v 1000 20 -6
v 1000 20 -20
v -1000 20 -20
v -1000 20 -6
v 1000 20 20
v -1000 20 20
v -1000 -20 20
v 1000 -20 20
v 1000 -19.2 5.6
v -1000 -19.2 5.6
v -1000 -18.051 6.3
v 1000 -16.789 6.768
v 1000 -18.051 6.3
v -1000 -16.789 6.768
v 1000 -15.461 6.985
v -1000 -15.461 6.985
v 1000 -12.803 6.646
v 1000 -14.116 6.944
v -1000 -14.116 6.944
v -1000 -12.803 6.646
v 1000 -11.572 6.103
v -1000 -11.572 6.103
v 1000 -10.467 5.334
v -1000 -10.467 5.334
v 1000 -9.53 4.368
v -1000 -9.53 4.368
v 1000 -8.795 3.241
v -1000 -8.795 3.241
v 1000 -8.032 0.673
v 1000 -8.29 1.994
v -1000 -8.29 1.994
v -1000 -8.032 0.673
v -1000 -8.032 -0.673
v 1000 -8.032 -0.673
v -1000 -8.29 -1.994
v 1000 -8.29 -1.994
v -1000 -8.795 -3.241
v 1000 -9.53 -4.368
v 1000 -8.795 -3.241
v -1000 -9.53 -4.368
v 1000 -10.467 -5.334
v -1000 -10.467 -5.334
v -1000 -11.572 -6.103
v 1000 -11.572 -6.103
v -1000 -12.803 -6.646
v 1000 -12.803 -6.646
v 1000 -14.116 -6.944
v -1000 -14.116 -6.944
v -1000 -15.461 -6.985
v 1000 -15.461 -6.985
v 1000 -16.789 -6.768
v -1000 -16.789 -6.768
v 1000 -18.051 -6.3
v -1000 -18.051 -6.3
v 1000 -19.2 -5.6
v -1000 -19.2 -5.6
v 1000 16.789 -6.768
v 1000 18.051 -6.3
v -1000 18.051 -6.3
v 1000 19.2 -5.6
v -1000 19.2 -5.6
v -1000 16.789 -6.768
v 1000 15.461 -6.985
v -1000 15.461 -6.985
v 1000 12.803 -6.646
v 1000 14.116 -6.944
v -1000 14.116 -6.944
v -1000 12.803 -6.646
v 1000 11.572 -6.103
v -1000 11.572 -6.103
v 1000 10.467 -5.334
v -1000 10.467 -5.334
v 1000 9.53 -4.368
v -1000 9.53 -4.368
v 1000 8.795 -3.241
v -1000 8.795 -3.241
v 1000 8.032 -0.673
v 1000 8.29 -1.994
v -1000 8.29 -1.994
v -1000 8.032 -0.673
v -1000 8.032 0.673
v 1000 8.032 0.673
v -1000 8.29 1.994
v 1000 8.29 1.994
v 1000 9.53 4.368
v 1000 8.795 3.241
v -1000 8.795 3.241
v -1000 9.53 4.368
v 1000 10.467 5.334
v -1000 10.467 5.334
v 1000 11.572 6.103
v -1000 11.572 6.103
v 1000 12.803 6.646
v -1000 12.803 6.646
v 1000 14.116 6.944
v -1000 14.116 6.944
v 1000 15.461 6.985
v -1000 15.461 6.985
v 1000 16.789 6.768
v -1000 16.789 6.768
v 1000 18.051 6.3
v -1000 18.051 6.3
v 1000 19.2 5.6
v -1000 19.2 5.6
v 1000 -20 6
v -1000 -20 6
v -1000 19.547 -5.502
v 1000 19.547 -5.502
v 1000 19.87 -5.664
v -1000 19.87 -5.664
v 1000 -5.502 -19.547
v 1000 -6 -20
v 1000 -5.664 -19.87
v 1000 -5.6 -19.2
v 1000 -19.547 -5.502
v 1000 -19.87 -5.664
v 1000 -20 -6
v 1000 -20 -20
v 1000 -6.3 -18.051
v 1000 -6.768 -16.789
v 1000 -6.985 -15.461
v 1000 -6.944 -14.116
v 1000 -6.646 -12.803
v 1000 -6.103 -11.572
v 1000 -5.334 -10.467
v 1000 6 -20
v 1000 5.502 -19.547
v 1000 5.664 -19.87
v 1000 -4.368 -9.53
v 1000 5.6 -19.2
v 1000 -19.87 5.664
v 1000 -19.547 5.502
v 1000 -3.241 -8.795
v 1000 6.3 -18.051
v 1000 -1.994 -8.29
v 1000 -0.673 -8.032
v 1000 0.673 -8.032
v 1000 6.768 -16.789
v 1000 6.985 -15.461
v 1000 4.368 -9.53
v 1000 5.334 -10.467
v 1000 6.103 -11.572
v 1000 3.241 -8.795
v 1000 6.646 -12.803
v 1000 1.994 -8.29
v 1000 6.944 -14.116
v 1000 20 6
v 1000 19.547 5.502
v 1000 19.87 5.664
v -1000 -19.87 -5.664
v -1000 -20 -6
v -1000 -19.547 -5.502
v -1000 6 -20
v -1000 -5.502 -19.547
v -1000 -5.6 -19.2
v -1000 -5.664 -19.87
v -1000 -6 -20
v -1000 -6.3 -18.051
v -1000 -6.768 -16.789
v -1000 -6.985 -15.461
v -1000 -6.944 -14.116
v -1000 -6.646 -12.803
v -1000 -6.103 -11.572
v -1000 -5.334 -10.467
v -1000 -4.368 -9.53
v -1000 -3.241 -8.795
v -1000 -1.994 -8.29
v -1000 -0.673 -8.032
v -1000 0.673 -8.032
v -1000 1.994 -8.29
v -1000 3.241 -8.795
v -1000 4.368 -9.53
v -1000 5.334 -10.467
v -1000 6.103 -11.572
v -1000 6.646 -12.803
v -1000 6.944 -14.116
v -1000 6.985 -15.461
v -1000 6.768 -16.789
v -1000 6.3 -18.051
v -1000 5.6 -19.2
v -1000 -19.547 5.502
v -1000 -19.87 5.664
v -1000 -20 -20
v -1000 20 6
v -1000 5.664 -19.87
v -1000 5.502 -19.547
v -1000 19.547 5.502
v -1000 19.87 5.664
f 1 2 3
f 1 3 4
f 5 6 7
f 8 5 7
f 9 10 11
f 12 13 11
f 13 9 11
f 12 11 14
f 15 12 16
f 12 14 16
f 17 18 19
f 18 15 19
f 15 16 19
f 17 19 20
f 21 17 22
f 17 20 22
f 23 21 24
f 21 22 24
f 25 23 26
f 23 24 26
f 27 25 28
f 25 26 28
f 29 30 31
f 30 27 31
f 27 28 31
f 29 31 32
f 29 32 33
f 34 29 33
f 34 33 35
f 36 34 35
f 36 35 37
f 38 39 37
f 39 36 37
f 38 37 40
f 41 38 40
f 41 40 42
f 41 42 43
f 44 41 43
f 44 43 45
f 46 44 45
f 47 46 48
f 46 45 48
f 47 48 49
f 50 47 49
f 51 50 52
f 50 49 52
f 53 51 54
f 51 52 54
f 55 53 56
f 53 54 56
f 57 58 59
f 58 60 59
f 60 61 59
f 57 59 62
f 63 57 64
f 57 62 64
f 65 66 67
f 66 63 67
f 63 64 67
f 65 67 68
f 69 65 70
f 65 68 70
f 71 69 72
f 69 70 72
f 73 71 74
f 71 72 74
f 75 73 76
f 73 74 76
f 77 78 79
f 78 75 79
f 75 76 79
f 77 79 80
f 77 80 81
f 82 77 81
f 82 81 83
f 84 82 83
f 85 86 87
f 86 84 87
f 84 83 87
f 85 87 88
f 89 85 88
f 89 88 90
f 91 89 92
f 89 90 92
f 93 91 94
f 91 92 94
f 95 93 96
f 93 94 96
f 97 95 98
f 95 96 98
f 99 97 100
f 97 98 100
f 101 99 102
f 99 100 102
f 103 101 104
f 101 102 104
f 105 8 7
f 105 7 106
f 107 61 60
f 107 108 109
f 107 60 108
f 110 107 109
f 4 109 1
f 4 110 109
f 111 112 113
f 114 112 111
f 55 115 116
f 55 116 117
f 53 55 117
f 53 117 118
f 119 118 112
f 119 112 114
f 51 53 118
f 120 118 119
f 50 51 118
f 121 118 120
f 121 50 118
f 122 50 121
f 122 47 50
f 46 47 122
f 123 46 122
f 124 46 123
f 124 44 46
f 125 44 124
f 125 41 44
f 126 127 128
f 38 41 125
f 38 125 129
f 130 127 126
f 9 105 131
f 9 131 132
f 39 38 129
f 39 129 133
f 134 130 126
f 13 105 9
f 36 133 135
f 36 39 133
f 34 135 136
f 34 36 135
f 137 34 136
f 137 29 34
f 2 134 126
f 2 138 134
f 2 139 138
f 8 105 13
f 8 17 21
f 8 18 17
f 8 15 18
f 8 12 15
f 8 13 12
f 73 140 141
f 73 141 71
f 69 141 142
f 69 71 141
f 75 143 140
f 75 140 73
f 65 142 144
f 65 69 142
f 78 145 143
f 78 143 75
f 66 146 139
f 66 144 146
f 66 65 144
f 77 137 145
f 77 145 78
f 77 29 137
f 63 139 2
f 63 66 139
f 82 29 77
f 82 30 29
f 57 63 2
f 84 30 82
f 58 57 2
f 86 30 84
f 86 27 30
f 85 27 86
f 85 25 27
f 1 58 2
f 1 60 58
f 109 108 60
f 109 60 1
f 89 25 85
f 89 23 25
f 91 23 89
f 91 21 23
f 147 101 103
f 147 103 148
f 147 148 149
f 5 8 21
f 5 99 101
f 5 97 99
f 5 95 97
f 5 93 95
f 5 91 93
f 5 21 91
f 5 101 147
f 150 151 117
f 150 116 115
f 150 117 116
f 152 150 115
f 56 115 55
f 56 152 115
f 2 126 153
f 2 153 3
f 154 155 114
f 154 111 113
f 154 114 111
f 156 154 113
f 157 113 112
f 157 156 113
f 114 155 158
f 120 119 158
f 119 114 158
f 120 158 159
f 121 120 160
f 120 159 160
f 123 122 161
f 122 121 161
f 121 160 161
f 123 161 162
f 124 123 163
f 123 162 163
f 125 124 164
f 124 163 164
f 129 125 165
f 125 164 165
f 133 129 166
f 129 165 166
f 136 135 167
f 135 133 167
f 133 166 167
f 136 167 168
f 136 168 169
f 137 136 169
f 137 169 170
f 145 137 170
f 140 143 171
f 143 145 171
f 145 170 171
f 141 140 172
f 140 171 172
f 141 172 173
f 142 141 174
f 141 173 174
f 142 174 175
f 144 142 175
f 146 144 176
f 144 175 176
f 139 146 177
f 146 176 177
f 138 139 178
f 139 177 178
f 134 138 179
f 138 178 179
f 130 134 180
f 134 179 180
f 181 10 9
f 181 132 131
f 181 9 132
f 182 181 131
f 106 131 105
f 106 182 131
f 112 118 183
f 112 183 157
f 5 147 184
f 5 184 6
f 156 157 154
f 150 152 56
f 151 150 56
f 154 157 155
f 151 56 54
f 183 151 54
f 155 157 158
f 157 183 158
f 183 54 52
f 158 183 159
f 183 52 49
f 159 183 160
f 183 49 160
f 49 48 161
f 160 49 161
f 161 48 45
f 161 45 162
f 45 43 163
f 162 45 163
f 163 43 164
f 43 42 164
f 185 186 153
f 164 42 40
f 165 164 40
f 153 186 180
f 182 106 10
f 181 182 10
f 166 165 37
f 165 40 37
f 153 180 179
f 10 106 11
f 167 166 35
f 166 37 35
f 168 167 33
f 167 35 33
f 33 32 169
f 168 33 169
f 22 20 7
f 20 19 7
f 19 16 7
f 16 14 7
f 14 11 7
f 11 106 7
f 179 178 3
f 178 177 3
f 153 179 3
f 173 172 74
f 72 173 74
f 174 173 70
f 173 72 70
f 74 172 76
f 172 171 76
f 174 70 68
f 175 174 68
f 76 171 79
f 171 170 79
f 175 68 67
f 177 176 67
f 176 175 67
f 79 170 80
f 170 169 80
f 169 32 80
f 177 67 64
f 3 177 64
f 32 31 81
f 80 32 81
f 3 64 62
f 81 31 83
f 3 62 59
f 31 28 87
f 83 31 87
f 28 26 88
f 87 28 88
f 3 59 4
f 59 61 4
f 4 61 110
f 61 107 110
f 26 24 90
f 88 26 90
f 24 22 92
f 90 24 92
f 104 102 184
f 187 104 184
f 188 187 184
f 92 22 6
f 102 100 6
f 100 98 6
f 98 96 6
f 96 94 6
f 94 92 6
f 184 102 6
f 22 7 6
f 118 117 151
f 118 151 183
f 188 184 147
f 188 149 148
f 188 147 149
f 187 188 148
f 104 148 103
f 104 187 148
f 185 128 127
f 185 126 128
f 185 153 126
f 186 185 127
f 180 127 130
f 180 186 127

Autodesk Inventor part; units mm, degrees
ref_plane "YZ Plane" through (0, 0, 0) normal (1, 0, 0) x (0, 1, 0)
ref_plane "XZ Plane" through (0, 0, 0) normal (0, 1, 0) x (-1, 0, 0)
ref_plane "XY Plane" through (0, 0, 0) normal (0, 0, 1) x (1, 0, 0)
sketch "Sketch1" plane through (0, 0, 0) normal (1, 0, 0) x (0, 1, 0)
  line L0 (20, 20) -> (-20, 20)
  arc A0 (5.6, -19.2) -> (-5.6, -19.2) centre (0, -15) ccw
  line L1 (-20, 20) -> (20, 20)
  arc A1 (19.2, 5.6) -> (19.2, -5.6) centre (15, 0) ccw
  line L2 (-20, 20) -> (20, 20)
  arc A2 (-19.2, -5.6) -> (-19.2, 5.6) centre (-15, 0) ccw
  line L3 (20, 20) -> (-20, 20)
  line L4 (-20, -20) -> (-6, -20)
  line L5 (6, -20) -> (20, -20)
  line L6 (-20, 20) -> (-20, 6)
  line L7 (-20, -6) -> (-20, -20)
  line L8 (20, -20) -> (20, -6)
  line L9 (20, 6) -> (20, 20)
  line L10 (20, 20) -> (20, 6)
  line L11 (20, -6) -> (20, -20)
  line L12 (-20, -20) -> (-20, -6)
  line L13 (-20, 6) -> (-20, 20)
  arc A3 (19.2, 5.6) -> (20, 6) centre (19.5, 6) ccw
  arc A4 (20, -6) -> (19.2, -5.6) centre (19.5, -6) ccw
  arc A5 (-6, -20) -> (-5.6, -19.2) centre (-6, -19.5) ccw
  arc A6 (5.6, -19.2) -> (6, -20) centre (6, -19.5) ccw
  arc A7 (-19.2, -5.6) -> (-20, -6) centre (-19.5, -6) ccw
  arc A8 (-20, 6) -> (-19.2, 5.6) centre (-19.5, 6) ccw
  point P0 (0, 0)
  point P1 (-4.899, -20)
  point P2 (4.899, -20)
  dimension "d3" = 40
  dimension "d4" = 40
  dimension "d5" = 40
  dimension "d9" = 14
  dimension "d10" = 0.5
  dimension "d11" = 0.5
extrude "Extrusion1" add sketch "Sketch1" along normal mid plane 2000
properties part number "launchrail"
